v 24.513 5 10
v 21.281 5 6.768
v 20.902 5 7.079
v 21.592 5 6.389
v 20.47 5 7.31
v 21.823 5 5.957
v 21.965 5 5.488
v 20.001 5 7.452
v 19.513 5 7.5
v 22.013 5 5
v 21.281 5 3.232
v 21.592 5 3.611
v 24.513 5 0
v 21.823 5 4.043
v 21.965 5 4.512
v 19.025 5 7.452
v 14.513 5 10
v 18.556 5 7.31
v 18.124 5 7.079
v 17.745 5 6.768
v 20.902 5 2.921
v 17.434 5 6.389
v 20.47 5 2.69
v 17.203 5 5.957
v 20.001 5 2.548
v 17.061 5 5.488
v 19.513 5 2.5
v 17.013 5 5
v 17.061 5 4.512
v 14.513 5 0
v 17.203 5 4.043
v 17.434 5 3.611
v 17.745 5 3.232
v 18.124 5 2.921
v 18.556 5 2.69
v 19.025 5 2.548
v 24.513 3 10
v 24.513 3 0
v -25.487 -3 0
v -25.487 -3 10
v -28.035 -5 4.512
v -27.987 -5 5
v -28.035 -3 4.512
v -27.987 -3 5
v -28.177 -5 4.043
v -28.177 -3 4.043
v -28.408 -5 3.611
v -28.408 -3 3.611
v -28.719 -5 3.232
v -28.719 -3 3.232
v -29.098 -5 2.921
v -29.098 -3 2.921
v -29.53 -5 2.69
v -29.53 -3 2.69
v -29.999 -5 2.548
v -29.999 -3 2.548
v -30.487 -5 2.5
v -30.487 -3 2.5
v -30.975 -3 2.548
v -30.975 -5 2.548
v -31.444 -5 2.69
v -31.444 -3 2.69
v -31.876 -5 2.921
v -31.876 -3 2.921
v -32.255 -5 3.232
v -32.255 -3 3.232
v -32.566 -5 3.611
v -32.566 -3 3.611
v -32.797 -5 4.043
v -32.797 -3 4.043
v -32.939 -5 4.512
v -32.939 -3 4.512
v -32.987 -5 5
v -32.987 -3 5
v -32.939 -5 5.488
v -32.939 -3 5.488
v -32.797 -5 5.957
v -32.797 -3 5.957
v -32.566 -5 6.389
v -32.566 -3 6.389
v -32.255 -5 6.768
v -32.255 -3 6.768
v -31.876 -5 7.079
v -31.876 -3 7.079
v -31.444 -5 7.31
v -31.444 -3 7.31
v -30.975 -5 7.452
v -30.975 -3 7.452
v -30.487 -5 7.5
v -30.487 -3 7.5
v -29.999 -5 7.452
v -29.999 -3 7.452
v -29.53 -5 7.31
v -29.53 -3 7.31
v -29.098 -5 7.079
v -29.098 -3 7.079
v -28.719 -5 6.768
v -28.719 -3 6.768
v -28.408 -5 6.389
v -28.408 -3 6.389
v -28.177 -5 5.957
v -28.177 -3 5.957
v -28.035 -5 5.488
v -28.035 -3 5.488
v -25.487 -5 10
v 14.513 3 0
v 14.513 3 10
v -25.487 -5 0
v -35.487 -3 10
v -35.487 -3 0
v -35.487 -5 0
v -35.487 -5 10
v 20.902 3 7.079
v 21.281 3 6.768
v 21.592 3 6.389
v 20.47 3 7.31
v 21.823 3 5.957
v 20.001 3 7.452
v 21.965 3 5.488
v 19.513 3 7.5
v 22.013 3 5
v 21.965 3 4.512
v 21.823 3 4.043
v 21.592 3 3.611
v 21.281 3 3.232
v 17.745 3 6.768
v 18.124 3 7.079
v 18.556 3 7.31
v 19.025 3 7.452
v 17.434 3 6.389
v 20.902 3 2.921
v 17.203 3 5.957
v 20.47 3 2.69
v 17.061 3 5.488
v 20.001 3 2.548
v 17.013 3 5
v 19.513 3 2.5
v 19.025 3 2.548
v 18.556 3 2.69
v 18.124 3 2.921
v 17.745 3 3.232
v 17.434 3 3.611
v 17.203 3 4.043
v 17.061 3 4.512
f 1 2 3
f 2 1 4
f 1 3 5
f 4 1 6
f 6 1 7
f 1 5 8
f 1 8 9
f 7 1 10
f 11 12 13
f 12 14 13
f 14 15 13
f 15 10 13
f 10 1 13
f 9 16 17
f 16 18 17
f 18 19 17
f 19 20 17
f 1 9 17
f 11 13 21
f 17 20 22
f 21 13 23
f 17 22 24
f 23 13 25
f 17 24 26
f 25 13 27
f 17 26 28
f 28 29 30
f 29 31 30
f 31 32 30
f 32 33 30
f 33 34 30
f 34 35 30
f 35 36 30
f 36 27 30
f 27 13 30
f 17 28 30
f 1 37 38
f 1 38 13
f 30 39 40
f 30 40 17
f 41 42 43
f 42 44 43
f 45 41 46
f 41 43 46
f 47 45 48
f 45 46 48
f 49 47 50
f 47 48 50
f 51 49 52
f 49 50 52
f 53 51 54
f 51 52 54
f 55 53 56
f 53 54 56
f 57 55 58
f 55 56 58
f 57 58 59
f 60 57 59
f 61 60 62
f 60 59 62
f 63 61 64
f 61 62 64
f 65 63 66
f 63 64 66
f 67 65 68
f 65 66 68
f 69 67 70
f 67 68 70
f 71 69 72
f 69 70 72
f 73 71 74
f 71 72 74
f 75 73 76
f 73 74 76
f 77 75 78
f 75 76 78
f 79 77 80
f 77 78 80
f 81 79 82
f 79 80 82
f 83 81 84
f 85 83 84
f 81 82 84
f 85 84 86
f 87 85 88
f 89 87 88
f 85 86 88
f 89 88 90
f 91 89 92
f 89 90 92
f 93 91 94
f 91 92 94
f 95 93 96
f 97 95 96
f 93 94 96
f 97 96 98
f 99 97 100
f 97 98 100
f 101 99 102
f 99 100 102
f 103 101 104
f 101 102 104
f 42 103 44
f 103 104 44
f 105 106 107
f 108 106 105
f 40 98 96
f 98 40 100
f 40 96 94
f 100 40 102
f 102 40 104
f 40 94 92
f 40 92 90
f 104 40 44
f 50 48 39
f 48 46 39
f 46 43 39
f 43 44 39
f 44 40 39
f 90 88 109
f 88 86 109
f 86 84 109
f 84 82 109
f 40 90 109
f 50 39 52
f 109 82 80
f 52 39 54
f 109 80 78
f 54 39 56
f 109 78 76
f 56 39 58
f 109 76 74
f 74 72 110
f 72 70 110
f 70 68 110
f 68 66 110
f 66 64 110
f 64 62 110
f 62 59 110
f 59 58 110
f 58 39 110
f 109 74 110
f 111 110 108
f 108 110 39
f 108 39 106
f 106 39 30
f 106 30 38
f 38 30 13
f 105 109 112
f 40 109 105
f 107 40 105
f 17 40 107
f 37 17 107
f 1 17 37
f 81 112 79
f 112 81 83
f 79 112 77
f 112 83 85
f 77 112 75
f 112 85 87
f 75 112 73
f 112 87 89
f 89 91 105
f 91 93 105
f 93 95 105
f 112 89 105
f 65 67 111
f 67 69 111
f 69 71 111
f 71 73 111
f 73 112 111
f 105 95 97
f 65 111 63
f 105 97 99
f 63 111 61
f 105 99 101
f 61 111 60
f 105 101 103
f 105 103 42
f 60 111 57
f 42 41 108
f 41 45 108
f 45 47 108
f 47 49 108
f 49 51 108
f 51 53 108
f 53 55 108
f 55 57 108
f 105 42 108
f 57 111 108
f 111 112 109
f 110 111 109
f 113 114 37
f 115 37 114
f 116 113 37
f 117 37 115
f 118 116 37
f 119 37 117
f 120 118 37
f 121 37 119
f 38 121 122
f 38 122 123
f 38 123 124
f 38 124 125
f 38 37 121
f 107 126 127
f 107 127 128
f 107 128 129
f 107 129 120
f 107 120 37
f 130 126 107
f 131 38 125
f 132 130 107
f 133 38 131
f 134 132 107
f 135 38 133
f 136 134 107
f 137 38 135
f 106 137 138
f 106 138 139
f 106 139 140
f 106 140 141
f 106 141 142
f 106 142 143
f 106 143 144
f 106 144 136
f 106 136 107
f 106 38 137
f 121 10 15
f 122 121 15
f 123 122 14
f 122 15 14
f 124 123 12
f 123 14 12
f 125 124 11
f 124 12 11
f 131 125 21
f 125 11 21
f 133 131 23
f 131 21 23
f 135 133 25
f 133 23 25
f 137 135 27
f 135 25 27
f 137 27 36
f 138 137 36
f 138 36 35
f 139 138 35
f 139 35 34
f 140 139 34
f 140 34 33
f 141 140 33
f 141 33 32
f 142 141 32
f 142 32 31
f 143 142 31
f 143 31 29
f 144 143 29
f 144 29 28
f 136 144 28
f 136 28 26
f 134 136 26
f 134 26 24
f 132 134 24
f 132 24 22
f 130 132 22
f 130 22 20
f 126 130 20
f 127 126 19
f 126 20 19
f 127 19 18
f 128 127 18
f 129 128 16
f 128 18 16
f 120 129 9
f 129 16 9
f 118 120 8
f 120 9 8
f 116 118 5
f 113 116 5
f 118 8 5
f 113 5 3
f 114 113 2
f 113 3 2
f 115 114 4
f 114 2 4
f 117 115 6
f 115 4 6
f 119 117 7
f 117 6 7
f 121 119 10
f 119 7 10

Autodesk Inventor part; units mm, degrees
ref_plane "YZ Plane" through (0, 0, 0) normal (1, 0, 0) x (0, 1, 0)
ref_plane "XZ Plane" through (0, 0, 0) normal (0, 1, 0) x (-1, 0, 0)
ref_plane "XY Plane" through (0, 0, 0) normal (0, 0, 1) x (1, 0, 0)
sketch "Szkic1" plane through (0, 0, 0) normal (0, 0, 1) x (1, 0, 0)
  line L0 (-35.4869, -5) -> (-25.4869, -5)
  line L1 (-25.4869, -3) -> (-35.4869, -3)
  line L2 (-35.4869, -5) -> (-35.4869, -3)
  line L3 (24.5131, 5) -> (14.5131, 5)
  line L4 (24.5131, 3) -> (24.5131, 3)
  line L5 (24.5131, 3) -> (24.5131, 5)
  line L6 (24.5131, 3) -> (14.5131, 3)
  line L7 (14.5131, 3) -> (-25.4869, -5)
  line L8 (-25.4869, -3) -> (14.5131, 5)
  point P0 (24.5131, 5)
  dimension "d9" = 10
  dimension "d10" = 2
  dimension "d11" = 10
  dimension "d14" = 60
  dimension "d15" = 10
extrude "Wyciągnięcie proste1" add sketch "Szkic1" along normal blind 10
sketch "Szkic2" plane through (-35.4869, -3, 0) normal (0, 1, 0) x (1, 0, 0)
  line L0 (10, 0) -> (10, -10) projected
  line L1 (10, -5) -> (0, -5)
  line L2 (0, 0) -> (0, -10) projected
  circle A0 centre (5, -5) radius 2.5
  point P0 (35.4869, 0)
  dimension "d16" = 5
extrude "Wyciągnięcie proste2" cut sketch "Szkic2" against normal blind 10
sketch "Szkic3" plane through (14.5131, 5, 0) normal (0, 1, 0) x (1, 0, 0)
  line L0 (10, 0) -> (10, -10) projected
  line L1 (10, -5) -> (0, -5)
  line L2 (0, 0) -> (0, -10) projected
  circle A0 centre (5, -5) radius 2.5
  point P0 (-14.5131, 0)
  dimension "d19" = 5
extrude "Wyciągnięcie proste3" cut sketch "Szkic3" against normal blind 10
properties part number "Docisk_sprężynka" material "Stal, węglowa"
